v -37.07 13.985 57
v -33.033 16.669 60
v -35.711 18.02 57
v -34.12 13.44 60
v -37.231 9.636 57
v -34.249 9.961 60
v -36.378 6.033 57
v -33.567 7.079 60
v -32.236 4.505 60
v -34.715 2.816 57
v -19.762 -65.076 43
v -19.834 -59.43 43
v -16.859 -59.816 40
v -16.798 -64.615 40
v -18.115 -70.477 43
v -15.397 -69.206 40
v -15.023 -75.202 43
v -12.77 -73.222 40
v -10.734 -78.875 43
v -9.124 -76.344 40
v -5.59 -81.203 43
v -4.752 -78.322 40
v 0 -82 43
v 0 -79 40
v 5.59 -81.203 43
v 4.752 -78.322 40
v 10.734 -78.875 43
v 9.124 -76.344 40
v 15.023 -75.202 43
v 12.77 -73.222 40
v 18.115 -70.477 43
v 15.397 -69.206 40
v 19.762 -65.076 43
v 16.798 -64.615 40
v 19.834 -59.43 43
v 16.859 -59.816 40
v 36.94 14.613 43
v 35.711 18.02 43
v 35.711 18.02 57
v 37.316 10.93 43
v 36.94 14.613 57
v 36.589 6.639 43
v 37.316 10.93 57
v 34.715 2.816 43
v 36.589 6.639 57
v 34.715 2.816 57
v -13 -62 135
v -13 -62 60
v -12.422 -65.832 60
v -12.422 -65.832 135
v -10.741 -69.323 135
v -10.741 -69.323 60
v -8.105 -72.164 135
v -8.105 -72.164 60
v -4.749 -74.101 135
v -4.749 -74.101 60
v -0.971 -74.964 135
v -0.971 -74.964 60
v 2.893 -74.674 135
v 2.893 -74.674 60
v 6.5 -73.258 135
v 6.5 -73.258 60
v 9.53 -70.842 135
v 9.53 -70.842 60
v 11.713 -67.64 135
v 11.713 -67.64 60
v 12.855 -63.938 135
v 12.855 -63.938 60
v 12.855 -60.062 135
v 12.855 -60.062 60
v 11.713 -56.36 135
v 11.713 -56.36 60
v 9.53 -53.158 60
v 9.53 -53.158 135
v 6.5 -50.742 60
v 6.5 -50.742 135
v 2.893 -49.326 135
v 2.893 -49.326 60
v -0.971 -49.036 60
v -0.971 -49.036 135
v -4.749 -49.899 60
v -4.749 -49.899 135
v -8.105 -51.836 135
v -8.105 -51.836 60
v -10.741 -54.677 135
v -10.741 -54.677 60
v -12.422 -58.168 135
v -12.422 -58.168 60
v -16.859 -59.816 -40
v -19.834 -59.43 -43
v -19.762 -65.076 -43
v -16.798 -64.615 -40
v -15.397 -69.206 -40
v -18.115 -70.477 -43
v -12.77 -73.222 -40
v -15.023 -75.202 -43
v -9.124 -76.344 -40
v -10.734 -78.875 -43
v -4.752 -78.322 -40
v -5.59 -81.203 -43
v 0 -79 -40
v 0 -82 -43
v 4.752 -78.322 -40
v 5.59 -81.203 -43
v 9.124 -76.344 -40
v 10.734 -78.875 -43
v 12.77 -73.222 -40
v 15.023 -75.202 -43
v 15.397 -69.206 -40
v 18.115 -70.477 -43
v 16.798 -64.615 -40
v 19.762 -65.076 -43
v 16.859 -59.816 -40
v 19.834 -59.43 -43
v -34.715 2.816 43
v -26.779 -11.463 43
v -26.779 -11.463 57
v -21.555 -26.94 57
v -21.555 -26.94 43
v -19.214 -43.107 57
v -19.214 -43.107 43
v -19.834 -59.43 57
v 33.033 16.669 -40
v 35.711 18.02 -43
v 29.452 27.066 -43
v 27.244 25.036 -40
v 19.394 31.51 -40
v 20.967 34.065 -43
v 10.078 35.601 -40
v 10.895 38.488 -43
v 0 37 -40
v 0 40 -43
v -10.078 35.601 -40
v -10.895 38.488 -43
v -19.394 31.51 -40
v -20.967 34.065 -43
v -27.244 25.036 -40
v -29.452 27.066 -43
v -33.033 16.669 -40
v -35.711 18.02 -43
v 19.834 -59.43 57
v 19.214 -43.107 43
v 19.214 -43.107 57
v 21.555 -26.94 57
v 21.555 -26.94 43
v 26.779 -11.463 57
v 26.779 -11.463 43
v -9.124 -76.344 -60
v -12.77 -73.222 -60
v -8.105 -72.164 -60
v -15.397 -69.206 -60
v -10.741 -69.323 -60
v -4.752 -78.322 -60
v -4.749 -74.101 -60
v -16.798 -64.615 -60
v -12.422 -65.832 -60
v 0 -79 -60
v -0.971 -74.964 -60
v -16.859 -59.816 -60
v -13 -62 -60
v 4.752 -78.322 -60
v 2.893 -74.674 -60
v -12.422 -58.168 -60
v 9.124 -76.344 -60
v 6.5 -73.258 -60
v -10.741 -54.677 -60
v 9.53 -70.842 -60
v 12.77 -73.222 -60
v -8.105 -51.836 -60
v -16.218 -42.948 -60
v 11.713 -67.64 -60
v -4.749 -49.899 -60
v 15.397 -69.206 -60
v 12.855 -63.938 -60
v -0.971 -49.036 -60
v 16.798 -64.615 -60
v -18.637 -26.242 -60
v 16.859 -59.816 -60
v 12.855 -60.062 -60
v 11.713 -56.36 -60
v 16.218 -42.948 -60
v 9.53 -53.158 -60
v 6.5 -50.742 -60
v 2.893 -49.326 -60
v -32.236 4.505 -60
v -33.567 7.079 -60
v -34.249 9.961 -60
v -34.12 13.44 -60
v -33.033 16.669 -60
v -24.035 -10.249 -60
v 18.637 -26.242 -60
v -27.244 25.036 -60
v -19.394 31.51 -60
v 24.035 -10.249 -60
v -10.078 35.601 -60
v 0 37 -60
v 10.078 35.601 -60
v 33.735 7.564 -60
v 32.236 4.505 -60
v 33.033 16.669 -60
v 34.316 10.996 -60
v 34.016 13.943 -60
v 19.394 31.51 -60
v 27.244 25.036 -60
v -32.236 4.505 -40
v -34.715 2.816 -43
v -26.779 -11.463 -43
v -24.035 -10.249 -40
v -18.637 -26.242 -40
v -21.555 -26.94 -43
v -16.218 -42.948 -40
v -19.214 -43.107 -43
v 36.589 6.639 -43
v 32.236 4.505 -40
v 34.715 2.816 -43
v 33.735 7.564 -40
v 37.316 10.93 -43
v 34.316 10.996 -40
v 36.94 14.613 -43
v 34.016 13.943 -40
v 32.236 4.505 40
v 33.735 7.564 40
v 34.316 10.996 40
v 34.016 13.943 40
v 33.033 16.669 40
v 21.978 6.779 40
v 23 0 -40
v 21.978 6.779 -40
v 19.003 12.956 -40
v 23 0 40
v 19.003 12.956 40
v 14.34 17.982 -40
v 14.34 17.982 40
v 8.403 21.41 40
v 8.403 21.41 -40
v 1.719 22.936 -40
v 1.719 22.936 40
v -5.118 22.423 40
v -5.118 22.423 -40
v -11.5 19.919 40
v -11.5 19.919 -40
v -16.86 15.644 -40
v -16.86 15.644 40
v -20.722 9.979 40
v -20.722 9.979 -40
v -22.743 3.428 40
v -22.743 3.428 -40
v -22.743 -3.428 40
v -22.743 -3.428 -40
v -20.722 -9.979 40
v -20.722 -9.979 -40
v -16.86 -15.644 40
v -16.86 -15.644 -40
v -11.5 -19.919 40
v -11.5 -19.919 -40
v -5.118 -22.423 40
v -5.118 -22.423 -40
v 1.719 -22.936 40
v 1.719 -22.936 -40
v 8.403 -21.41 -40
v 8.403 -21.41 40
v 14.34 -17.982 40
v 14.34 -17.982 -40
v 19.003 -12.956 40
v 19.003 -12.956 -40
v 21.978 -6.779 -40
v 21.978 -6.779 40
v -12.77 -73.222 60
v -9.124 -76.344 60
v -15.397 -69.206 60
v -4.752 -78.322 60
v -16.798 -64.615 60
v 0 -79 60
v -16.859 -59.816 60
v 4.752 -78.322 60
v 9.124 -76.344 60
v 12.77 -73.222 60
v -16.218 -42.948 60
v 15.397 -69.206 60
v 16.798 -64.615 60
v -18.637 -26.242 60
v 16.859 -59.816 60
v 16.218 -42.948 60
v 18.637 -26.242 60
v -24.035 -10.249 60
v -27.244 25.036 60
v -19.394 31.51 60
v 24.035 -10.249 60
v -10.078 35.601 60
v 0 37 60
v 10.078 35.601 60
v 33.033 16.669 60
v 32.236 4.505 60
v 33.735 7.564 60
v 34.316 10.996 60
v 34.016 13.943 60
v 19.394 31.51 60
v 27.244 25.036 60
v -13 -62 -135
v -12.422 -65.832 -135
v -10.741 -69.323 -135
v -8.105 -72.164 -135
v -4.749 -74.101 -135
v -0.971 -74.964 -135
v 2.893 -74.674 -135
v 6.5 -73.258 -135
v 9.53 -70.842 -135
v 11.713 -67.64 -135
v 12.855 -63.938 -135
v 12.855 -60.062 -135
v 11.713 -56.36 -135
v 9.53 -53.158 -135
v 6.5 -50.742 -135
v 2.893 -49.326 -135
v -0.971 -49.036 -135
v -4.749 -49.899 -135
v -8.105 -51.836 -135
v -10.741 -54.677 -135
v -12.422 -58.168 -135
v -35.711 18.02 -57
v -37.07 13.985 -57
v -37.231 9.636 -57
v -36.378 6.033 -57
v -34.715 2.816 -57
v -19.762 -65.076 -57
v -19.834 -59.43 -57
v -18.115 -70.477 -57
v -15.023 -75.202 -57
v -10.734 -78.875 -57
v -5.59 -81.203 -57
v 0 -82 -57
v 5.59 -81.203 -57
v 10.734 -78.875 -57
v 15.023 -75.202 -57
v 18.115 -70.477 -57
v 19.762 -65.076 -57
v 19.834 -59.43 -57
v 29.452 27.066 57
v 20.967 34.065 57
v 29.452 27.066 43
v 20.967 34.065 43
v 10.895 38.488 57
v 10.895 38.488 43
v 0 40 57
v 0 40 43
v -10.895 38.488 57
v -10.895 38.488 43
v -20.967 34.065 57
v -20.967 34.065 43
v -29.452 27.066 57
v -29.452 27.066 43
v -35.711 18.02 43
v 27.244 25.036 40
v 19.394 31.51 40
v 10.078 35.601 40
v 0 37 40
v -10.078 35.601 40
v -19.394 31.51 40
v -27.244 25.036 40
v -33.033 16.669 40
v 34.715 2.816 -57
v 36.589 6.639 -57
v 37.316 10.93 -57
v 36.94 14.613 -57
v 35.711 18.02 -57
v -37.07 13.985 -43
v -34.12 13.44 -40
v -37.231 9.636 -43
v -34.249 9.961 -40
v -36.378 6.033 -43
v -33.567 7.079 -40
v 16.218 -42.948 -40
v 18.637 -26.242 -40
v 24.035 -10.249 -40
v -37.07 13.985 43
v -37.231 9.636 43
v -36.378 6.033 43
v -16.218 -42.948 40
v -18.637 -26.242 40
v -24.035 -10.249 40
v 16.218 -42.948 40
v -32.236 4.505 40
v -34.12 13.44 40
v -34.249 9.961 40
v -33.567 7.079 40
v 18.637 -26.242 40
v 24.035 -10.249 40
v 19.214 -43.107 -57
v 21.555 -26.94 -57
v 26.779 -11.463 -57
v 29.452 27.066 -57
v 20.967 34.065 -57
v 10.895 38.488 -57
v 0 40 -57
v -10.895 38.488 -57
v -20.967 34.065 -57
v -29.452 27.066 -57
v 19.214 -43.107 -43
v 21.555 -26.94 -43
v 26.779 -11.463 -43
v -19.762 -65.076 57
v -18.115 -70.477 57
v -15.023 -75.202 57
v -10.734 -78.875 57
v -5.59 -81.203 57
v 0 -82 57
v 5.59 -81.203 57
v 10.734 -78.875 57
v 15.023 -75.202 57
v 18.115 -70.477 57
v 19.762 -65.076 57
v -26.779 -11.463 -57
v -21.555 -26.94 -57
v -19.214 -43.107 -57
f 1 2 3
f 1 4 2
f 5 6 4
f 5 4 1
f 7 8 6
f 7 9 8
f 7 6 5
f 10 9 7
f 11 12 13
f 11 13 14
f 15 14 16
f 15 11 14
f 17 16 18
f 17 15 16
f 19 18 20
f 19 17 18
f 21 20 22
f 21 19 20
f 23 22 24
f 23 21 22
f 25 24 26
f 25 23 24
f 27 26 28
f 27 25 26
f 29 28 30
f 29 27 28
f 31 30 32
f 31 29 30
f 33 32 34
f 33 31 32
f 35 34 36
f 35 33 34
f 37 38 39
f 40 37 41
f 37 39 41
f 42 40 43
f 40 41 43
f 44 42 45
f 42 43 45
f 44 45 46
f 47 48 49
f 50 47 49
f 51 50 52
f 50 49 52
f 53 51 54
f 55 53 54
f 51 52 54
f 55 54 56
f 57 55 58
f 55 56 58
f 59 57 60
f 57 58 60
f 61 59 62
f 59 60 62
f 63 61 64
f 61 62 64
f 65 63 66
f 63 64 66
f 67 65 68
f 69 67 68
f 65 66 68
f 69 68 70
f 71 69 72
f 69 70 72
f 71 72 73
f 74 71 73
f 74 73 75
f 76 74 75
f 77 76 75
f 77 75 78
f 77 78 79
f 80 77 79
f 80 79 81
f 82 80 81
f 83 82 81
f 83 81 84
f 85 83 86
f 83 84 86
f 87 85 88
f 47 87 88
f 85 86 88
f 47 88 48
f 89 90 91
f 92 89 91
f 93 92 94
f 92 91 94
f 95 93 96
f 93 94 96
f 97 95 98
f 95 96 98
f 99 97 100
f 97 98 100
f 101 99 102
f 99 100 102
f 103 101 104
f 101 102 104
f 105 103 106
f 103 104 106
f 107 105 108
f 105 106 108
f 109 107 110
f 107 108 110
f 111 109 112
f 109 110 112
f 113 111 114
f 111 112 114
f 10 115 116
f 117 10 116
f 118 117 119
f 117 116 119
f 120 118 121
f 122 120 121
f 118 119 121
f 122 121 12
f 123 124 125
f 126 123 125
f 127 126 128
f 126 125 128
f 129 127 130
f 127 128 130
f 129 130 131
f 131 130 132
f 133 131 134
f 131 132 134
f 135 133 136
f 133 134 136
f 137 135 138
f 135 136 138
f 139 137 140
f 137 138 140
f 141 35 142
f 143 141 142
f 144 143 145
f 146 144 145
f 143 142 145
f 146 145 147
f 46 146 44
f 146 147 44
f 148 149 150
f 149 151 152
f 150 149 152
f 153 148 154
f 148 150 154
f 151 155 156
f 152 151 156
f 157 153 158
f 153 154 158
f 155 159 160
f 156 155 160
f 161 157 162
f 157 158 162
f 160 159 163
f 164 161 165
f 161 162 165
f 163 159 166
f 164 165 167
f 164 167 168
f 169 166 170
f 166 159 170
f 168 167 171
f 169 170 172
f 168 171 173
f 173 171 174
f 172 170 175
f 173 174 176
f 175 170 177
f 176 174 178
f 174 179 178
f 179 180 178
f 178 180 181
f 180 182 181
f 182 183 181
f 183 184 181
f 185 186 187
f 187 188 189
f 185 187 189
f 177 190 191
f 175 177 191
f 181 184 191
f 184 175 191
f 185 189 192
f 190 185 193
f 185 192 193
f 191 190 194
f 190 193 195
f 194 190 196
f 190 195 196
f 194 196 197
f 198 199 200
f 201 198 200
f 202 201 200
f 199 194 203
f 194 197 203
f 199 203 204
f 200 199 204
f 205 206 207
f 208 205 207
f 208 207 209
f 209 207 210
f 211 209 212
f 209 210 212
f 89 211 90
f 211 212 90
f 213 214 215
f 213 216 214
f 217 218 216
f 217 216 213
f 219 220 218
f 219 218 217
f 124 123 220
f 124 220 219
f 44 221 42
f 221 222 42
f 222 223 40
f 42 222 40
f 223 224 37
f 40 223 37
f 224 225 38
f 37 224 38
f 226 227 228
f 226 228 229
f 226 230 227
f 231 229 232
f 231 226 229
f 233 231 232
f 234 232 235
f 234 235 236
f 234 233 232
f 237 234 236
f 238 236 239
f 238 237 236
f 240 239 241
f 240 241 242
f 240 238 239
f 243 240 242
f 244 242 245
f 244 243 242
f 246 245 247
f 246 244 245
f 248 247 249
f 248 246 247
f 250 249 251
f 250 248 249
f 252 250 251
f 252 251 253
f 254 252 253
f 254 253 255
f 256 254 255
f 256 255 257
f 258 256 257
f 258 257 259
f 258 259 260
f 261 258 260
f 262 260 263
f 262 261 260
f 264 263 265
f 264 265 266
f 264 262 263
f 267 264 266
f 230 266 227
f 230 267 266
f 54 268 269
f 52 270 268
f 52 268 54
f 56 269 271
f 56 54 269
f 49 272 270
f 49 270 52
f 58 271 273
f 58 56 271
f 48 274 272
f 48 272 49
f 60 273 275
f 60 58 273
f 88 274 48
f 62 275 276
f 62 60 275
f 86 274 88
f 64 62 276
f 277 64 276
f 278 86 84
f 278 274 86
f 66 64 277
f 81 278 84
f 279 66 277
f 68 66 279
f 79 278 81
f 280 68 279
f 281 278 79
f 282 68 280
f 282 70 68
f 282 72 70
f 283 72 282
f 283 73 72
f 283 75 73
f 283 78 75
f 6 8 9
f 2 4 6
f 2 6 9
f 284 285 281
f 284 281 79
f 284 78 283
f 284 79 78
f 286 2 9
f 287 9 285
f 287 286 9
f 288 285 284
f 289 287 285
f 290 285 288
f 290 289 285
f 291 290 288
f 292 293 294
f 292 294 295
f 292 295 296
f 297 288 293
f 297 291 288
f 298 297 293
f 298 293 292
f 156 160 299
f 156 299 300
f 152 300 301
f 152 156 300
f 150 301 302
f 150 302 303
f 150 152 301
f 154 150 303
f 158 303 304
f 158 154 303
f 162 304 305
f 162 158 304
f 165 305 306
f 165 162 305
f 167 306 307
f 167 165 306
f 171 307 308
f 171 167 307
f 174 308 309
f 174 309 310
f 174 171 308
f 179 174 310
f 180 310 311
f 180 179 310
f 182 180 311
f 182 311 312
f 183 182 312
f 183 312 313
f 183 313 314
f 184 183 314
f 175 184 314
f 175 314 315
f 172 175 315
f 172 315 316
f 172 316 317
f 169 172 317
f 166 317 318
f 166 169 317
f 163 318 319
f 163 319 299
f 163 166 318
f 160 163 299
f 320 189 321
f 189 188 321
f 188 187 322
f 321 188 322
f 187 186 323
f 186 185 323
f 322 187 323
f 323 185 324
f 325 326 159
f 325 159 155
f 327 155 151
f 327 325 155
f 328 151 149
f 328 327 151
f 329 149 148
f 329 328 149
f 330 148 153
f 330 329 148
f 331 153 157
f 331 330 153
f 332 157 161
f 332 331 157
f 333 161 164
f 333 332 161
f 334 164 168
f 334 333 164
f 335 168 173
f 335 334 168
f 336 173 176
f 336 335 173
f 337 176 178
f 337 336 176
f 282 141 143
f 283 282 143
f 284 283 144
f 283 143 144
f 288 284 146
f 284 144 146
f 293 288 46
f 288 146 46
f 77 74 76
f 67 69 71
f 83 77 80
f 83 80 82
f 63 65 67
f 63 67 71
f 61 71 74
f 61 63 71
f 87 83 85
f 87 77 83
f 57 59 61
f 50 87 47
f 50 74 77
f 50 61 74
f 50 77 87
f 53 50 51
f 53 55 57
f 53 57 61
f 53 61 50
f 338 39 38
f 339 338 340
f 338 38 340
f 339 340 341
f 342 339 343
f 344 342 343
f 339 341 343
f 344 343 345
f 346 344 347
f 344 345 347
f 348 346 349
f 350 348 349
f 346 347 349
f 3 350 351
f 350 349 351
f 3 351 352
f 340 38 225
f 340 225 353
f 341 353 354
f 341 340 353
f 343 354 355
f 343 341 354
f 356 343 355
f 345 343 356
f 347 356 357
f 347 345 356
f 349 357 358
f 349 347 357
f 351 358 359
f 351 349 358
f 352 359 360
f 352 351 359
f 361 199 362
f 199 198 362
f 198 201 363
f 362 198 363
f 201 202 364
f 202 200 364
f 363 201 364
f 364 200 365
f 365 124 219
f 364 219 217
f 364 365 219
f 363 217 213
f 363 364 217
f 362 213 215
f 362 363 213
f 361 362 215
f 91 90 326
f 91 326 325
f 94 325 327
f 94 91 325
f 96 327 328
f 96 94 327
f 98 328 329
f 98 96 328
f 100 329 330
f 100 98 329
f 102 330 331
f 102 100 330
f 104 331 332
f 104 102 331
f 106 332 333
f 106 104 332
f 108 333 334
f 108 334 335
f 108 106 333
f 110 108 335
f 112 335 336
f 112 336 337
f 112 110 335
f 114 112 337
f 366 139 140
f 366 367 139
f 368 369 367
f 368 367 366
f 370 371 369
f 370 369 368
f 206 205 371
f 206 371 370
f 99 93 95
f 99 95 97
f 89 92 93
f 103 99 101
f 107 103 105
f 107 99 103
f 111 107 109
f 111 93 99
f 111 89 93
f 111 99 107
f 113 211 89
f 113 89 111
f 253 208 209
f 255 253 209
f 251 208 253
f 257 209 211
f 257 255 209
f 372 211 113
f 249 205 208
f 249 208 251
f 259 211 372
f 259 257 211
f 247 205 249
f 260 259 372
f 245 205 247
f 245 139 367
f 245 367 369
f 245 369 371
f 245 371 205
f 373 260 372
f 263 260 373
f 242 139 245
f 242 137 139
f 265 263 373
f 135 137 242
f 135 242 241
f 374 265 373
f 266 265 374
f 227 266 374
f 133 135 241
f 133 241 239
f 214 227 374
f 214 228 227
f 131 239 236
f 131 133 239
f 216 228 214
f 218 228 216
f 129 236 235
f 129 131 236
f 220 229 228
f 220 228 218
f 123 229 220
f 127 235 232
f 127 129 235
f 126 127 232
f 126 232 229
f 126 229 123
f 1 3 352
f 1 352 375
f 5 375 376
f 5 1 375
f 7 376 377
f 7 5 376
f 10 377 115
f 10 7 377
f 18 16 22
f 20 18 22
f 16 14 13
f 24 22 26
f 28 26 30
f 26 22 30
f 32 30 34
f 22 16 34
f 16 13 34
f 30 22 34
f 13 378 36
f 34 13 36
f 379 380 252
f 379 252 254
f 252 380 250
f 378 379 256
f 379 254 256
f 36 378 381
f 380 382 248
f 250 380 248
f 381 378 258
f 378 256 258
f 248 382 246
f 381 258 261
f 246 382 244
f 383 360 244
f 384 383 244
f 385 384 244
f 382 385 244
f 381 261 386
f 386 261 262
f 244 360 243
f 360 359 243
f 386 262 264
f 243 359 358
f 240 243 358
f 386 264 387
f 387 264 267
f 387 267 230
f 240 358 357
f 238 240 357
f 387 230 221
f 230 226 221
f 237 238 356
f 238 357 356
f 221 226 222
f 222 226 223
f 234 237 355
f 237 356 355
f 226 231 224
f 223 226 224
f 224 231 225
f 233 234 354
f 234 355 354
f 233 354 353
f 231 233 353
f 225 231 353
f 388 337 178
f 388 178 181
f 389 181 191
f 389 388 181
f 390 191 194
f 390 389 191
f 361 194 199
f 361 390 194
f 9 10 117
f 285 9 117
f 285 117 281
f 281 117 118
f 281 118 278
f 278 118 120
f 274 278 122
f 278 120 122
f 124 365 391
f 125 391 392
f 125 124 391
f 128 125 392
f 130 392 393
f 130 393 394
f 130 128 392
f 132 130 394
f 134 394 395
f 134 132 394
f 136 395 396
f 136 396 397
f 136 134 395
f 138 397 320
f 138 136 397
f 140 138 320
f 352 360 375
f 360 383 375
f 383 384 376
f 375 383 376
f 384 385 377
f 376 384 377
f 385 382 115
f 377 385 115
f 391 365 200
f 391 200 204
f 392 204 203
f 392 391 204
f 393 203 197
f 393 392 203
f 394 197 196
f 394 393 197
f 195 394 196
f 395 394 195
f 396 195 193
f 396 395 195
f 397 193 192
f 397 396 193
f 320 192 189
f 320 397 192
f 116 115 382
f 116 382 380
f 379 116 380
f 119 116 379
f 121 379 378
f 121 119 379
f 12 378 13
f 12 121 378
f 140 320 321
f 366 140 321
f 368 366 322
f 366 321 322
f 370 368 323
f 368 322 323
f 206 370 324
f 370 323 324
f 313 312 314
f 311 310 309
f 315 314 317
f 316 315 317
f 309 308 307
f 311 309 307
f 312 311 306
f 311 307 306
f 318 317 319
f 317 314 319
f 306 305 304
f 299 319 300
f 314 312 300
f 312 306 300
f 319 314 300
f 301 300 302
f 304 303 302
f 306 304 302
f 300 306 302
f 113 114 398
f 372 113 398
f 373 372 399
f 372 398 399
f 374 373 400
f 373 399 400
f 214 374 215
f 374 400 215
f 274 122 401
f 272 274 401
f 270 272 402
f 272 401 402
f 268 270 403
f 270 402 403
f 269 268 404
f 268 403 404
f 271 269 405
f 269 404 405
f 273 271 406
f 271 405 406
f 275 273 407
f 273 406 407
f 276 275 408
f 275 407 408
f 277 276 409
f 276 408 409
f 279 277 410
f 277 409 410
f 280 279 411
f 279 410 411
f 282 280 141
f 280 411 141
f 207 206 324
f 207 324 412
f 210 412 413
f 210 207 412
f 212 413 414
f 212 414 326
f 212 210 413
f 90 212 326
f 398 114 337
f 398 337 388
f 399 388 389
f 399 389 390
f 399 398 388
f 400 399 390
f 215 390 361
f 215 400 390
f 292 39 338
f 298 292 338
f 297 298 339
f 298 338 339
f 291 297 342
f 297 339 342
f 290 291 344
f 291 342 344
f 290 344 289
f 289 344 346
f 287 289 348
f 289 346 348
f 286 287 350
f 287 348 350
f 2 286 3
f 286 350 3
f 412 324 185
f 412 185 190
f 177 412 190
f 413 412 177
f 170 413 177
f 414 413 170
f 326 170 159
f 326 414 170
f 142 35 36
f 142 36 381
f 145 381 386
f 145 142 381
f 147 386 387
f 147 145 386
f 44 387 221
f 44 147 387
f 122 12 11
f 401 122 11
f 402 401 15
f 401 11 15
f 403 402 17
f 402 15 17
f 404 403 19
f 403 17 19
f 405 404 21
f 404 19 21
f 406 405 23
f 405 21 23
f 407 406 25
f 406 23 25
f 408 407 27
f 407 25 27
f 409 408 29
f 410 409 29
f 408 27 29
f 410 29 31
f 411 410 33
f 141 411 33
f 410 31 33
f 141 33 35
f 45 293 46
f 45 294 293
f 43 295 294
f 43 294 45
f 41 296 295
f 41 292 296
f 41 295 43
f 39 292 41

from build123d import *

# Parameters (mm, degrees)
SKETCH1_R                = 23
BOSS_EXTRUDE1_DEPTH      = 40
BOSS_EXTRUDE2_DEPTH      = 20
SKETCH3_R                = 13
BOSS_EXTRUDE3_DEPTH      = 75
FILLET1_R                = 15
CHAMFER2_SIZE            = 3
FILLET1_OF_MIRROR1_R     = 15
CHAMFER2_OF_MIRROR1_SIZE = 3


with BuildPart() as part:
    # Sketch1 → Boss-Extrude1 (new body, symmetric)
    with BuildSketch(Plane.XY):
        Circle(SKETCH1_R)
    extrude(amount=BOSS_EXTRUDE1_DEPTH, both=True)

    # Sketch2 → Boss-Extrude2 (add)
    with BuildSketch(Plane.XY.offset(40)):
        with BuildLine():
            ThreePointArc((39.051840285, 8.657584558), (0, 40), (-39.051840285, 8.657584558))
            ThreePointArc((-39.051840285, 8.657584558), (-22.47215166, -23.418781152), (-19.834213041, -59.430176458))
            ThreePointArc((-19.834213041, -59.430176458), (0, -82), (19.834213041, -59.430176458))
            ThreePointArc((19.834213041, -59.430176458), (22.47215166, -23.418781152), (39.051840285, 8.657584558))
        make_face()
    boss_extrude2 = extrude(amount=BOSS_EXTRUDE2_DEPTH)

    # Sketch3 → Boss-Extrude3 (add)
    with BuildSketch(Plane.XY.offset(60)):
        with Locations(Location((0, -62, 0), (0, 0, 180))):  # turned: the seam where the file's is
            Circle(SKETCH3_R)
    boss_extrude3 = extrude(amount=BOSS_EXTRUDE3_DEPTH)

    # Fillet1
    fillet1_edges = [part.edges().sort_by_distance(p)[0] for p in [
        (-39.051840285, 8.657584558, 50),
        (39.051840285, 8.657584558, 50),
    ]]
    fillet(fillet1_edges, radius=FILLET1_R)

    # Chamfer2
    chamfer2_edges = [part.edges().sort_by_distance(p)[0] for p in [
        (-21.554755506, -26.939885243, 40),
        (-21.554755506, -26.939885243, 60),
        (0, 40, 40),
        (37.287308792, 10.281927657, 40),
        (-37.287308792, 10.281927657, 40),
        (0, 40, 60),
        (37.287308792, 10.281927657, 60),
        (-37.287308792, 10.281927657, 60),
        (0, -82, 40),
        (21.554755506, -26.939885243, 40),
        (0, -82, 60),
        (21.554755506, -26.939885243, 60),
    ]]
    chamfer(chamfer2_edges, length=CHAMFER2_SIZE)

    # Mirror1: Boss-Extrude2, Boss-Extrude3 across plane
    add(boss_extrude2.mirror(Plane.XY))
    add(boss_extrude3.mirror(Plane.XY))

    # Fillet1 of Mirror1
    fillet1_of_mirror1_edges = [part.edges().sort_by_distance(p)[0] for p in [
        (-39.051840285, 8.657584558, -50),
        (39.051840285, 8.657584558, -50),
    ]]
    fillet(fillet1_of_mirror1_edges, radius=FILLET1_OF_MIRROR1_R)

    # Chamfer2 of Mirror1
    chamfer2_of_mirror1_edges = [part.edges().sort_by_distance(p)[0] for p in [
        (-21.554755506, -26.939885243, -40),
        (-21.554755506, -26.939885243, -60),
        (0, 40, -40),
        (37.287308792, 10.281927657, -40),
        (-37.287308792, 10.281927657, -40),
        (0, 40, -60),
        (37.287308792, 10.281927657, -60),
        (-37.287308792, 10.281927657, -60),
        (0, -82, -40),
        (21.554755506, -26.939885243, -40),
        (0, -82, -60),
        (21.554755506, -26.939885243, -60),
    ]]
    chamfer(chamfer2_of_mirror1_edges, length=CHAMFER2_OF_MIRROR1_SIZE)


solid = part.part
